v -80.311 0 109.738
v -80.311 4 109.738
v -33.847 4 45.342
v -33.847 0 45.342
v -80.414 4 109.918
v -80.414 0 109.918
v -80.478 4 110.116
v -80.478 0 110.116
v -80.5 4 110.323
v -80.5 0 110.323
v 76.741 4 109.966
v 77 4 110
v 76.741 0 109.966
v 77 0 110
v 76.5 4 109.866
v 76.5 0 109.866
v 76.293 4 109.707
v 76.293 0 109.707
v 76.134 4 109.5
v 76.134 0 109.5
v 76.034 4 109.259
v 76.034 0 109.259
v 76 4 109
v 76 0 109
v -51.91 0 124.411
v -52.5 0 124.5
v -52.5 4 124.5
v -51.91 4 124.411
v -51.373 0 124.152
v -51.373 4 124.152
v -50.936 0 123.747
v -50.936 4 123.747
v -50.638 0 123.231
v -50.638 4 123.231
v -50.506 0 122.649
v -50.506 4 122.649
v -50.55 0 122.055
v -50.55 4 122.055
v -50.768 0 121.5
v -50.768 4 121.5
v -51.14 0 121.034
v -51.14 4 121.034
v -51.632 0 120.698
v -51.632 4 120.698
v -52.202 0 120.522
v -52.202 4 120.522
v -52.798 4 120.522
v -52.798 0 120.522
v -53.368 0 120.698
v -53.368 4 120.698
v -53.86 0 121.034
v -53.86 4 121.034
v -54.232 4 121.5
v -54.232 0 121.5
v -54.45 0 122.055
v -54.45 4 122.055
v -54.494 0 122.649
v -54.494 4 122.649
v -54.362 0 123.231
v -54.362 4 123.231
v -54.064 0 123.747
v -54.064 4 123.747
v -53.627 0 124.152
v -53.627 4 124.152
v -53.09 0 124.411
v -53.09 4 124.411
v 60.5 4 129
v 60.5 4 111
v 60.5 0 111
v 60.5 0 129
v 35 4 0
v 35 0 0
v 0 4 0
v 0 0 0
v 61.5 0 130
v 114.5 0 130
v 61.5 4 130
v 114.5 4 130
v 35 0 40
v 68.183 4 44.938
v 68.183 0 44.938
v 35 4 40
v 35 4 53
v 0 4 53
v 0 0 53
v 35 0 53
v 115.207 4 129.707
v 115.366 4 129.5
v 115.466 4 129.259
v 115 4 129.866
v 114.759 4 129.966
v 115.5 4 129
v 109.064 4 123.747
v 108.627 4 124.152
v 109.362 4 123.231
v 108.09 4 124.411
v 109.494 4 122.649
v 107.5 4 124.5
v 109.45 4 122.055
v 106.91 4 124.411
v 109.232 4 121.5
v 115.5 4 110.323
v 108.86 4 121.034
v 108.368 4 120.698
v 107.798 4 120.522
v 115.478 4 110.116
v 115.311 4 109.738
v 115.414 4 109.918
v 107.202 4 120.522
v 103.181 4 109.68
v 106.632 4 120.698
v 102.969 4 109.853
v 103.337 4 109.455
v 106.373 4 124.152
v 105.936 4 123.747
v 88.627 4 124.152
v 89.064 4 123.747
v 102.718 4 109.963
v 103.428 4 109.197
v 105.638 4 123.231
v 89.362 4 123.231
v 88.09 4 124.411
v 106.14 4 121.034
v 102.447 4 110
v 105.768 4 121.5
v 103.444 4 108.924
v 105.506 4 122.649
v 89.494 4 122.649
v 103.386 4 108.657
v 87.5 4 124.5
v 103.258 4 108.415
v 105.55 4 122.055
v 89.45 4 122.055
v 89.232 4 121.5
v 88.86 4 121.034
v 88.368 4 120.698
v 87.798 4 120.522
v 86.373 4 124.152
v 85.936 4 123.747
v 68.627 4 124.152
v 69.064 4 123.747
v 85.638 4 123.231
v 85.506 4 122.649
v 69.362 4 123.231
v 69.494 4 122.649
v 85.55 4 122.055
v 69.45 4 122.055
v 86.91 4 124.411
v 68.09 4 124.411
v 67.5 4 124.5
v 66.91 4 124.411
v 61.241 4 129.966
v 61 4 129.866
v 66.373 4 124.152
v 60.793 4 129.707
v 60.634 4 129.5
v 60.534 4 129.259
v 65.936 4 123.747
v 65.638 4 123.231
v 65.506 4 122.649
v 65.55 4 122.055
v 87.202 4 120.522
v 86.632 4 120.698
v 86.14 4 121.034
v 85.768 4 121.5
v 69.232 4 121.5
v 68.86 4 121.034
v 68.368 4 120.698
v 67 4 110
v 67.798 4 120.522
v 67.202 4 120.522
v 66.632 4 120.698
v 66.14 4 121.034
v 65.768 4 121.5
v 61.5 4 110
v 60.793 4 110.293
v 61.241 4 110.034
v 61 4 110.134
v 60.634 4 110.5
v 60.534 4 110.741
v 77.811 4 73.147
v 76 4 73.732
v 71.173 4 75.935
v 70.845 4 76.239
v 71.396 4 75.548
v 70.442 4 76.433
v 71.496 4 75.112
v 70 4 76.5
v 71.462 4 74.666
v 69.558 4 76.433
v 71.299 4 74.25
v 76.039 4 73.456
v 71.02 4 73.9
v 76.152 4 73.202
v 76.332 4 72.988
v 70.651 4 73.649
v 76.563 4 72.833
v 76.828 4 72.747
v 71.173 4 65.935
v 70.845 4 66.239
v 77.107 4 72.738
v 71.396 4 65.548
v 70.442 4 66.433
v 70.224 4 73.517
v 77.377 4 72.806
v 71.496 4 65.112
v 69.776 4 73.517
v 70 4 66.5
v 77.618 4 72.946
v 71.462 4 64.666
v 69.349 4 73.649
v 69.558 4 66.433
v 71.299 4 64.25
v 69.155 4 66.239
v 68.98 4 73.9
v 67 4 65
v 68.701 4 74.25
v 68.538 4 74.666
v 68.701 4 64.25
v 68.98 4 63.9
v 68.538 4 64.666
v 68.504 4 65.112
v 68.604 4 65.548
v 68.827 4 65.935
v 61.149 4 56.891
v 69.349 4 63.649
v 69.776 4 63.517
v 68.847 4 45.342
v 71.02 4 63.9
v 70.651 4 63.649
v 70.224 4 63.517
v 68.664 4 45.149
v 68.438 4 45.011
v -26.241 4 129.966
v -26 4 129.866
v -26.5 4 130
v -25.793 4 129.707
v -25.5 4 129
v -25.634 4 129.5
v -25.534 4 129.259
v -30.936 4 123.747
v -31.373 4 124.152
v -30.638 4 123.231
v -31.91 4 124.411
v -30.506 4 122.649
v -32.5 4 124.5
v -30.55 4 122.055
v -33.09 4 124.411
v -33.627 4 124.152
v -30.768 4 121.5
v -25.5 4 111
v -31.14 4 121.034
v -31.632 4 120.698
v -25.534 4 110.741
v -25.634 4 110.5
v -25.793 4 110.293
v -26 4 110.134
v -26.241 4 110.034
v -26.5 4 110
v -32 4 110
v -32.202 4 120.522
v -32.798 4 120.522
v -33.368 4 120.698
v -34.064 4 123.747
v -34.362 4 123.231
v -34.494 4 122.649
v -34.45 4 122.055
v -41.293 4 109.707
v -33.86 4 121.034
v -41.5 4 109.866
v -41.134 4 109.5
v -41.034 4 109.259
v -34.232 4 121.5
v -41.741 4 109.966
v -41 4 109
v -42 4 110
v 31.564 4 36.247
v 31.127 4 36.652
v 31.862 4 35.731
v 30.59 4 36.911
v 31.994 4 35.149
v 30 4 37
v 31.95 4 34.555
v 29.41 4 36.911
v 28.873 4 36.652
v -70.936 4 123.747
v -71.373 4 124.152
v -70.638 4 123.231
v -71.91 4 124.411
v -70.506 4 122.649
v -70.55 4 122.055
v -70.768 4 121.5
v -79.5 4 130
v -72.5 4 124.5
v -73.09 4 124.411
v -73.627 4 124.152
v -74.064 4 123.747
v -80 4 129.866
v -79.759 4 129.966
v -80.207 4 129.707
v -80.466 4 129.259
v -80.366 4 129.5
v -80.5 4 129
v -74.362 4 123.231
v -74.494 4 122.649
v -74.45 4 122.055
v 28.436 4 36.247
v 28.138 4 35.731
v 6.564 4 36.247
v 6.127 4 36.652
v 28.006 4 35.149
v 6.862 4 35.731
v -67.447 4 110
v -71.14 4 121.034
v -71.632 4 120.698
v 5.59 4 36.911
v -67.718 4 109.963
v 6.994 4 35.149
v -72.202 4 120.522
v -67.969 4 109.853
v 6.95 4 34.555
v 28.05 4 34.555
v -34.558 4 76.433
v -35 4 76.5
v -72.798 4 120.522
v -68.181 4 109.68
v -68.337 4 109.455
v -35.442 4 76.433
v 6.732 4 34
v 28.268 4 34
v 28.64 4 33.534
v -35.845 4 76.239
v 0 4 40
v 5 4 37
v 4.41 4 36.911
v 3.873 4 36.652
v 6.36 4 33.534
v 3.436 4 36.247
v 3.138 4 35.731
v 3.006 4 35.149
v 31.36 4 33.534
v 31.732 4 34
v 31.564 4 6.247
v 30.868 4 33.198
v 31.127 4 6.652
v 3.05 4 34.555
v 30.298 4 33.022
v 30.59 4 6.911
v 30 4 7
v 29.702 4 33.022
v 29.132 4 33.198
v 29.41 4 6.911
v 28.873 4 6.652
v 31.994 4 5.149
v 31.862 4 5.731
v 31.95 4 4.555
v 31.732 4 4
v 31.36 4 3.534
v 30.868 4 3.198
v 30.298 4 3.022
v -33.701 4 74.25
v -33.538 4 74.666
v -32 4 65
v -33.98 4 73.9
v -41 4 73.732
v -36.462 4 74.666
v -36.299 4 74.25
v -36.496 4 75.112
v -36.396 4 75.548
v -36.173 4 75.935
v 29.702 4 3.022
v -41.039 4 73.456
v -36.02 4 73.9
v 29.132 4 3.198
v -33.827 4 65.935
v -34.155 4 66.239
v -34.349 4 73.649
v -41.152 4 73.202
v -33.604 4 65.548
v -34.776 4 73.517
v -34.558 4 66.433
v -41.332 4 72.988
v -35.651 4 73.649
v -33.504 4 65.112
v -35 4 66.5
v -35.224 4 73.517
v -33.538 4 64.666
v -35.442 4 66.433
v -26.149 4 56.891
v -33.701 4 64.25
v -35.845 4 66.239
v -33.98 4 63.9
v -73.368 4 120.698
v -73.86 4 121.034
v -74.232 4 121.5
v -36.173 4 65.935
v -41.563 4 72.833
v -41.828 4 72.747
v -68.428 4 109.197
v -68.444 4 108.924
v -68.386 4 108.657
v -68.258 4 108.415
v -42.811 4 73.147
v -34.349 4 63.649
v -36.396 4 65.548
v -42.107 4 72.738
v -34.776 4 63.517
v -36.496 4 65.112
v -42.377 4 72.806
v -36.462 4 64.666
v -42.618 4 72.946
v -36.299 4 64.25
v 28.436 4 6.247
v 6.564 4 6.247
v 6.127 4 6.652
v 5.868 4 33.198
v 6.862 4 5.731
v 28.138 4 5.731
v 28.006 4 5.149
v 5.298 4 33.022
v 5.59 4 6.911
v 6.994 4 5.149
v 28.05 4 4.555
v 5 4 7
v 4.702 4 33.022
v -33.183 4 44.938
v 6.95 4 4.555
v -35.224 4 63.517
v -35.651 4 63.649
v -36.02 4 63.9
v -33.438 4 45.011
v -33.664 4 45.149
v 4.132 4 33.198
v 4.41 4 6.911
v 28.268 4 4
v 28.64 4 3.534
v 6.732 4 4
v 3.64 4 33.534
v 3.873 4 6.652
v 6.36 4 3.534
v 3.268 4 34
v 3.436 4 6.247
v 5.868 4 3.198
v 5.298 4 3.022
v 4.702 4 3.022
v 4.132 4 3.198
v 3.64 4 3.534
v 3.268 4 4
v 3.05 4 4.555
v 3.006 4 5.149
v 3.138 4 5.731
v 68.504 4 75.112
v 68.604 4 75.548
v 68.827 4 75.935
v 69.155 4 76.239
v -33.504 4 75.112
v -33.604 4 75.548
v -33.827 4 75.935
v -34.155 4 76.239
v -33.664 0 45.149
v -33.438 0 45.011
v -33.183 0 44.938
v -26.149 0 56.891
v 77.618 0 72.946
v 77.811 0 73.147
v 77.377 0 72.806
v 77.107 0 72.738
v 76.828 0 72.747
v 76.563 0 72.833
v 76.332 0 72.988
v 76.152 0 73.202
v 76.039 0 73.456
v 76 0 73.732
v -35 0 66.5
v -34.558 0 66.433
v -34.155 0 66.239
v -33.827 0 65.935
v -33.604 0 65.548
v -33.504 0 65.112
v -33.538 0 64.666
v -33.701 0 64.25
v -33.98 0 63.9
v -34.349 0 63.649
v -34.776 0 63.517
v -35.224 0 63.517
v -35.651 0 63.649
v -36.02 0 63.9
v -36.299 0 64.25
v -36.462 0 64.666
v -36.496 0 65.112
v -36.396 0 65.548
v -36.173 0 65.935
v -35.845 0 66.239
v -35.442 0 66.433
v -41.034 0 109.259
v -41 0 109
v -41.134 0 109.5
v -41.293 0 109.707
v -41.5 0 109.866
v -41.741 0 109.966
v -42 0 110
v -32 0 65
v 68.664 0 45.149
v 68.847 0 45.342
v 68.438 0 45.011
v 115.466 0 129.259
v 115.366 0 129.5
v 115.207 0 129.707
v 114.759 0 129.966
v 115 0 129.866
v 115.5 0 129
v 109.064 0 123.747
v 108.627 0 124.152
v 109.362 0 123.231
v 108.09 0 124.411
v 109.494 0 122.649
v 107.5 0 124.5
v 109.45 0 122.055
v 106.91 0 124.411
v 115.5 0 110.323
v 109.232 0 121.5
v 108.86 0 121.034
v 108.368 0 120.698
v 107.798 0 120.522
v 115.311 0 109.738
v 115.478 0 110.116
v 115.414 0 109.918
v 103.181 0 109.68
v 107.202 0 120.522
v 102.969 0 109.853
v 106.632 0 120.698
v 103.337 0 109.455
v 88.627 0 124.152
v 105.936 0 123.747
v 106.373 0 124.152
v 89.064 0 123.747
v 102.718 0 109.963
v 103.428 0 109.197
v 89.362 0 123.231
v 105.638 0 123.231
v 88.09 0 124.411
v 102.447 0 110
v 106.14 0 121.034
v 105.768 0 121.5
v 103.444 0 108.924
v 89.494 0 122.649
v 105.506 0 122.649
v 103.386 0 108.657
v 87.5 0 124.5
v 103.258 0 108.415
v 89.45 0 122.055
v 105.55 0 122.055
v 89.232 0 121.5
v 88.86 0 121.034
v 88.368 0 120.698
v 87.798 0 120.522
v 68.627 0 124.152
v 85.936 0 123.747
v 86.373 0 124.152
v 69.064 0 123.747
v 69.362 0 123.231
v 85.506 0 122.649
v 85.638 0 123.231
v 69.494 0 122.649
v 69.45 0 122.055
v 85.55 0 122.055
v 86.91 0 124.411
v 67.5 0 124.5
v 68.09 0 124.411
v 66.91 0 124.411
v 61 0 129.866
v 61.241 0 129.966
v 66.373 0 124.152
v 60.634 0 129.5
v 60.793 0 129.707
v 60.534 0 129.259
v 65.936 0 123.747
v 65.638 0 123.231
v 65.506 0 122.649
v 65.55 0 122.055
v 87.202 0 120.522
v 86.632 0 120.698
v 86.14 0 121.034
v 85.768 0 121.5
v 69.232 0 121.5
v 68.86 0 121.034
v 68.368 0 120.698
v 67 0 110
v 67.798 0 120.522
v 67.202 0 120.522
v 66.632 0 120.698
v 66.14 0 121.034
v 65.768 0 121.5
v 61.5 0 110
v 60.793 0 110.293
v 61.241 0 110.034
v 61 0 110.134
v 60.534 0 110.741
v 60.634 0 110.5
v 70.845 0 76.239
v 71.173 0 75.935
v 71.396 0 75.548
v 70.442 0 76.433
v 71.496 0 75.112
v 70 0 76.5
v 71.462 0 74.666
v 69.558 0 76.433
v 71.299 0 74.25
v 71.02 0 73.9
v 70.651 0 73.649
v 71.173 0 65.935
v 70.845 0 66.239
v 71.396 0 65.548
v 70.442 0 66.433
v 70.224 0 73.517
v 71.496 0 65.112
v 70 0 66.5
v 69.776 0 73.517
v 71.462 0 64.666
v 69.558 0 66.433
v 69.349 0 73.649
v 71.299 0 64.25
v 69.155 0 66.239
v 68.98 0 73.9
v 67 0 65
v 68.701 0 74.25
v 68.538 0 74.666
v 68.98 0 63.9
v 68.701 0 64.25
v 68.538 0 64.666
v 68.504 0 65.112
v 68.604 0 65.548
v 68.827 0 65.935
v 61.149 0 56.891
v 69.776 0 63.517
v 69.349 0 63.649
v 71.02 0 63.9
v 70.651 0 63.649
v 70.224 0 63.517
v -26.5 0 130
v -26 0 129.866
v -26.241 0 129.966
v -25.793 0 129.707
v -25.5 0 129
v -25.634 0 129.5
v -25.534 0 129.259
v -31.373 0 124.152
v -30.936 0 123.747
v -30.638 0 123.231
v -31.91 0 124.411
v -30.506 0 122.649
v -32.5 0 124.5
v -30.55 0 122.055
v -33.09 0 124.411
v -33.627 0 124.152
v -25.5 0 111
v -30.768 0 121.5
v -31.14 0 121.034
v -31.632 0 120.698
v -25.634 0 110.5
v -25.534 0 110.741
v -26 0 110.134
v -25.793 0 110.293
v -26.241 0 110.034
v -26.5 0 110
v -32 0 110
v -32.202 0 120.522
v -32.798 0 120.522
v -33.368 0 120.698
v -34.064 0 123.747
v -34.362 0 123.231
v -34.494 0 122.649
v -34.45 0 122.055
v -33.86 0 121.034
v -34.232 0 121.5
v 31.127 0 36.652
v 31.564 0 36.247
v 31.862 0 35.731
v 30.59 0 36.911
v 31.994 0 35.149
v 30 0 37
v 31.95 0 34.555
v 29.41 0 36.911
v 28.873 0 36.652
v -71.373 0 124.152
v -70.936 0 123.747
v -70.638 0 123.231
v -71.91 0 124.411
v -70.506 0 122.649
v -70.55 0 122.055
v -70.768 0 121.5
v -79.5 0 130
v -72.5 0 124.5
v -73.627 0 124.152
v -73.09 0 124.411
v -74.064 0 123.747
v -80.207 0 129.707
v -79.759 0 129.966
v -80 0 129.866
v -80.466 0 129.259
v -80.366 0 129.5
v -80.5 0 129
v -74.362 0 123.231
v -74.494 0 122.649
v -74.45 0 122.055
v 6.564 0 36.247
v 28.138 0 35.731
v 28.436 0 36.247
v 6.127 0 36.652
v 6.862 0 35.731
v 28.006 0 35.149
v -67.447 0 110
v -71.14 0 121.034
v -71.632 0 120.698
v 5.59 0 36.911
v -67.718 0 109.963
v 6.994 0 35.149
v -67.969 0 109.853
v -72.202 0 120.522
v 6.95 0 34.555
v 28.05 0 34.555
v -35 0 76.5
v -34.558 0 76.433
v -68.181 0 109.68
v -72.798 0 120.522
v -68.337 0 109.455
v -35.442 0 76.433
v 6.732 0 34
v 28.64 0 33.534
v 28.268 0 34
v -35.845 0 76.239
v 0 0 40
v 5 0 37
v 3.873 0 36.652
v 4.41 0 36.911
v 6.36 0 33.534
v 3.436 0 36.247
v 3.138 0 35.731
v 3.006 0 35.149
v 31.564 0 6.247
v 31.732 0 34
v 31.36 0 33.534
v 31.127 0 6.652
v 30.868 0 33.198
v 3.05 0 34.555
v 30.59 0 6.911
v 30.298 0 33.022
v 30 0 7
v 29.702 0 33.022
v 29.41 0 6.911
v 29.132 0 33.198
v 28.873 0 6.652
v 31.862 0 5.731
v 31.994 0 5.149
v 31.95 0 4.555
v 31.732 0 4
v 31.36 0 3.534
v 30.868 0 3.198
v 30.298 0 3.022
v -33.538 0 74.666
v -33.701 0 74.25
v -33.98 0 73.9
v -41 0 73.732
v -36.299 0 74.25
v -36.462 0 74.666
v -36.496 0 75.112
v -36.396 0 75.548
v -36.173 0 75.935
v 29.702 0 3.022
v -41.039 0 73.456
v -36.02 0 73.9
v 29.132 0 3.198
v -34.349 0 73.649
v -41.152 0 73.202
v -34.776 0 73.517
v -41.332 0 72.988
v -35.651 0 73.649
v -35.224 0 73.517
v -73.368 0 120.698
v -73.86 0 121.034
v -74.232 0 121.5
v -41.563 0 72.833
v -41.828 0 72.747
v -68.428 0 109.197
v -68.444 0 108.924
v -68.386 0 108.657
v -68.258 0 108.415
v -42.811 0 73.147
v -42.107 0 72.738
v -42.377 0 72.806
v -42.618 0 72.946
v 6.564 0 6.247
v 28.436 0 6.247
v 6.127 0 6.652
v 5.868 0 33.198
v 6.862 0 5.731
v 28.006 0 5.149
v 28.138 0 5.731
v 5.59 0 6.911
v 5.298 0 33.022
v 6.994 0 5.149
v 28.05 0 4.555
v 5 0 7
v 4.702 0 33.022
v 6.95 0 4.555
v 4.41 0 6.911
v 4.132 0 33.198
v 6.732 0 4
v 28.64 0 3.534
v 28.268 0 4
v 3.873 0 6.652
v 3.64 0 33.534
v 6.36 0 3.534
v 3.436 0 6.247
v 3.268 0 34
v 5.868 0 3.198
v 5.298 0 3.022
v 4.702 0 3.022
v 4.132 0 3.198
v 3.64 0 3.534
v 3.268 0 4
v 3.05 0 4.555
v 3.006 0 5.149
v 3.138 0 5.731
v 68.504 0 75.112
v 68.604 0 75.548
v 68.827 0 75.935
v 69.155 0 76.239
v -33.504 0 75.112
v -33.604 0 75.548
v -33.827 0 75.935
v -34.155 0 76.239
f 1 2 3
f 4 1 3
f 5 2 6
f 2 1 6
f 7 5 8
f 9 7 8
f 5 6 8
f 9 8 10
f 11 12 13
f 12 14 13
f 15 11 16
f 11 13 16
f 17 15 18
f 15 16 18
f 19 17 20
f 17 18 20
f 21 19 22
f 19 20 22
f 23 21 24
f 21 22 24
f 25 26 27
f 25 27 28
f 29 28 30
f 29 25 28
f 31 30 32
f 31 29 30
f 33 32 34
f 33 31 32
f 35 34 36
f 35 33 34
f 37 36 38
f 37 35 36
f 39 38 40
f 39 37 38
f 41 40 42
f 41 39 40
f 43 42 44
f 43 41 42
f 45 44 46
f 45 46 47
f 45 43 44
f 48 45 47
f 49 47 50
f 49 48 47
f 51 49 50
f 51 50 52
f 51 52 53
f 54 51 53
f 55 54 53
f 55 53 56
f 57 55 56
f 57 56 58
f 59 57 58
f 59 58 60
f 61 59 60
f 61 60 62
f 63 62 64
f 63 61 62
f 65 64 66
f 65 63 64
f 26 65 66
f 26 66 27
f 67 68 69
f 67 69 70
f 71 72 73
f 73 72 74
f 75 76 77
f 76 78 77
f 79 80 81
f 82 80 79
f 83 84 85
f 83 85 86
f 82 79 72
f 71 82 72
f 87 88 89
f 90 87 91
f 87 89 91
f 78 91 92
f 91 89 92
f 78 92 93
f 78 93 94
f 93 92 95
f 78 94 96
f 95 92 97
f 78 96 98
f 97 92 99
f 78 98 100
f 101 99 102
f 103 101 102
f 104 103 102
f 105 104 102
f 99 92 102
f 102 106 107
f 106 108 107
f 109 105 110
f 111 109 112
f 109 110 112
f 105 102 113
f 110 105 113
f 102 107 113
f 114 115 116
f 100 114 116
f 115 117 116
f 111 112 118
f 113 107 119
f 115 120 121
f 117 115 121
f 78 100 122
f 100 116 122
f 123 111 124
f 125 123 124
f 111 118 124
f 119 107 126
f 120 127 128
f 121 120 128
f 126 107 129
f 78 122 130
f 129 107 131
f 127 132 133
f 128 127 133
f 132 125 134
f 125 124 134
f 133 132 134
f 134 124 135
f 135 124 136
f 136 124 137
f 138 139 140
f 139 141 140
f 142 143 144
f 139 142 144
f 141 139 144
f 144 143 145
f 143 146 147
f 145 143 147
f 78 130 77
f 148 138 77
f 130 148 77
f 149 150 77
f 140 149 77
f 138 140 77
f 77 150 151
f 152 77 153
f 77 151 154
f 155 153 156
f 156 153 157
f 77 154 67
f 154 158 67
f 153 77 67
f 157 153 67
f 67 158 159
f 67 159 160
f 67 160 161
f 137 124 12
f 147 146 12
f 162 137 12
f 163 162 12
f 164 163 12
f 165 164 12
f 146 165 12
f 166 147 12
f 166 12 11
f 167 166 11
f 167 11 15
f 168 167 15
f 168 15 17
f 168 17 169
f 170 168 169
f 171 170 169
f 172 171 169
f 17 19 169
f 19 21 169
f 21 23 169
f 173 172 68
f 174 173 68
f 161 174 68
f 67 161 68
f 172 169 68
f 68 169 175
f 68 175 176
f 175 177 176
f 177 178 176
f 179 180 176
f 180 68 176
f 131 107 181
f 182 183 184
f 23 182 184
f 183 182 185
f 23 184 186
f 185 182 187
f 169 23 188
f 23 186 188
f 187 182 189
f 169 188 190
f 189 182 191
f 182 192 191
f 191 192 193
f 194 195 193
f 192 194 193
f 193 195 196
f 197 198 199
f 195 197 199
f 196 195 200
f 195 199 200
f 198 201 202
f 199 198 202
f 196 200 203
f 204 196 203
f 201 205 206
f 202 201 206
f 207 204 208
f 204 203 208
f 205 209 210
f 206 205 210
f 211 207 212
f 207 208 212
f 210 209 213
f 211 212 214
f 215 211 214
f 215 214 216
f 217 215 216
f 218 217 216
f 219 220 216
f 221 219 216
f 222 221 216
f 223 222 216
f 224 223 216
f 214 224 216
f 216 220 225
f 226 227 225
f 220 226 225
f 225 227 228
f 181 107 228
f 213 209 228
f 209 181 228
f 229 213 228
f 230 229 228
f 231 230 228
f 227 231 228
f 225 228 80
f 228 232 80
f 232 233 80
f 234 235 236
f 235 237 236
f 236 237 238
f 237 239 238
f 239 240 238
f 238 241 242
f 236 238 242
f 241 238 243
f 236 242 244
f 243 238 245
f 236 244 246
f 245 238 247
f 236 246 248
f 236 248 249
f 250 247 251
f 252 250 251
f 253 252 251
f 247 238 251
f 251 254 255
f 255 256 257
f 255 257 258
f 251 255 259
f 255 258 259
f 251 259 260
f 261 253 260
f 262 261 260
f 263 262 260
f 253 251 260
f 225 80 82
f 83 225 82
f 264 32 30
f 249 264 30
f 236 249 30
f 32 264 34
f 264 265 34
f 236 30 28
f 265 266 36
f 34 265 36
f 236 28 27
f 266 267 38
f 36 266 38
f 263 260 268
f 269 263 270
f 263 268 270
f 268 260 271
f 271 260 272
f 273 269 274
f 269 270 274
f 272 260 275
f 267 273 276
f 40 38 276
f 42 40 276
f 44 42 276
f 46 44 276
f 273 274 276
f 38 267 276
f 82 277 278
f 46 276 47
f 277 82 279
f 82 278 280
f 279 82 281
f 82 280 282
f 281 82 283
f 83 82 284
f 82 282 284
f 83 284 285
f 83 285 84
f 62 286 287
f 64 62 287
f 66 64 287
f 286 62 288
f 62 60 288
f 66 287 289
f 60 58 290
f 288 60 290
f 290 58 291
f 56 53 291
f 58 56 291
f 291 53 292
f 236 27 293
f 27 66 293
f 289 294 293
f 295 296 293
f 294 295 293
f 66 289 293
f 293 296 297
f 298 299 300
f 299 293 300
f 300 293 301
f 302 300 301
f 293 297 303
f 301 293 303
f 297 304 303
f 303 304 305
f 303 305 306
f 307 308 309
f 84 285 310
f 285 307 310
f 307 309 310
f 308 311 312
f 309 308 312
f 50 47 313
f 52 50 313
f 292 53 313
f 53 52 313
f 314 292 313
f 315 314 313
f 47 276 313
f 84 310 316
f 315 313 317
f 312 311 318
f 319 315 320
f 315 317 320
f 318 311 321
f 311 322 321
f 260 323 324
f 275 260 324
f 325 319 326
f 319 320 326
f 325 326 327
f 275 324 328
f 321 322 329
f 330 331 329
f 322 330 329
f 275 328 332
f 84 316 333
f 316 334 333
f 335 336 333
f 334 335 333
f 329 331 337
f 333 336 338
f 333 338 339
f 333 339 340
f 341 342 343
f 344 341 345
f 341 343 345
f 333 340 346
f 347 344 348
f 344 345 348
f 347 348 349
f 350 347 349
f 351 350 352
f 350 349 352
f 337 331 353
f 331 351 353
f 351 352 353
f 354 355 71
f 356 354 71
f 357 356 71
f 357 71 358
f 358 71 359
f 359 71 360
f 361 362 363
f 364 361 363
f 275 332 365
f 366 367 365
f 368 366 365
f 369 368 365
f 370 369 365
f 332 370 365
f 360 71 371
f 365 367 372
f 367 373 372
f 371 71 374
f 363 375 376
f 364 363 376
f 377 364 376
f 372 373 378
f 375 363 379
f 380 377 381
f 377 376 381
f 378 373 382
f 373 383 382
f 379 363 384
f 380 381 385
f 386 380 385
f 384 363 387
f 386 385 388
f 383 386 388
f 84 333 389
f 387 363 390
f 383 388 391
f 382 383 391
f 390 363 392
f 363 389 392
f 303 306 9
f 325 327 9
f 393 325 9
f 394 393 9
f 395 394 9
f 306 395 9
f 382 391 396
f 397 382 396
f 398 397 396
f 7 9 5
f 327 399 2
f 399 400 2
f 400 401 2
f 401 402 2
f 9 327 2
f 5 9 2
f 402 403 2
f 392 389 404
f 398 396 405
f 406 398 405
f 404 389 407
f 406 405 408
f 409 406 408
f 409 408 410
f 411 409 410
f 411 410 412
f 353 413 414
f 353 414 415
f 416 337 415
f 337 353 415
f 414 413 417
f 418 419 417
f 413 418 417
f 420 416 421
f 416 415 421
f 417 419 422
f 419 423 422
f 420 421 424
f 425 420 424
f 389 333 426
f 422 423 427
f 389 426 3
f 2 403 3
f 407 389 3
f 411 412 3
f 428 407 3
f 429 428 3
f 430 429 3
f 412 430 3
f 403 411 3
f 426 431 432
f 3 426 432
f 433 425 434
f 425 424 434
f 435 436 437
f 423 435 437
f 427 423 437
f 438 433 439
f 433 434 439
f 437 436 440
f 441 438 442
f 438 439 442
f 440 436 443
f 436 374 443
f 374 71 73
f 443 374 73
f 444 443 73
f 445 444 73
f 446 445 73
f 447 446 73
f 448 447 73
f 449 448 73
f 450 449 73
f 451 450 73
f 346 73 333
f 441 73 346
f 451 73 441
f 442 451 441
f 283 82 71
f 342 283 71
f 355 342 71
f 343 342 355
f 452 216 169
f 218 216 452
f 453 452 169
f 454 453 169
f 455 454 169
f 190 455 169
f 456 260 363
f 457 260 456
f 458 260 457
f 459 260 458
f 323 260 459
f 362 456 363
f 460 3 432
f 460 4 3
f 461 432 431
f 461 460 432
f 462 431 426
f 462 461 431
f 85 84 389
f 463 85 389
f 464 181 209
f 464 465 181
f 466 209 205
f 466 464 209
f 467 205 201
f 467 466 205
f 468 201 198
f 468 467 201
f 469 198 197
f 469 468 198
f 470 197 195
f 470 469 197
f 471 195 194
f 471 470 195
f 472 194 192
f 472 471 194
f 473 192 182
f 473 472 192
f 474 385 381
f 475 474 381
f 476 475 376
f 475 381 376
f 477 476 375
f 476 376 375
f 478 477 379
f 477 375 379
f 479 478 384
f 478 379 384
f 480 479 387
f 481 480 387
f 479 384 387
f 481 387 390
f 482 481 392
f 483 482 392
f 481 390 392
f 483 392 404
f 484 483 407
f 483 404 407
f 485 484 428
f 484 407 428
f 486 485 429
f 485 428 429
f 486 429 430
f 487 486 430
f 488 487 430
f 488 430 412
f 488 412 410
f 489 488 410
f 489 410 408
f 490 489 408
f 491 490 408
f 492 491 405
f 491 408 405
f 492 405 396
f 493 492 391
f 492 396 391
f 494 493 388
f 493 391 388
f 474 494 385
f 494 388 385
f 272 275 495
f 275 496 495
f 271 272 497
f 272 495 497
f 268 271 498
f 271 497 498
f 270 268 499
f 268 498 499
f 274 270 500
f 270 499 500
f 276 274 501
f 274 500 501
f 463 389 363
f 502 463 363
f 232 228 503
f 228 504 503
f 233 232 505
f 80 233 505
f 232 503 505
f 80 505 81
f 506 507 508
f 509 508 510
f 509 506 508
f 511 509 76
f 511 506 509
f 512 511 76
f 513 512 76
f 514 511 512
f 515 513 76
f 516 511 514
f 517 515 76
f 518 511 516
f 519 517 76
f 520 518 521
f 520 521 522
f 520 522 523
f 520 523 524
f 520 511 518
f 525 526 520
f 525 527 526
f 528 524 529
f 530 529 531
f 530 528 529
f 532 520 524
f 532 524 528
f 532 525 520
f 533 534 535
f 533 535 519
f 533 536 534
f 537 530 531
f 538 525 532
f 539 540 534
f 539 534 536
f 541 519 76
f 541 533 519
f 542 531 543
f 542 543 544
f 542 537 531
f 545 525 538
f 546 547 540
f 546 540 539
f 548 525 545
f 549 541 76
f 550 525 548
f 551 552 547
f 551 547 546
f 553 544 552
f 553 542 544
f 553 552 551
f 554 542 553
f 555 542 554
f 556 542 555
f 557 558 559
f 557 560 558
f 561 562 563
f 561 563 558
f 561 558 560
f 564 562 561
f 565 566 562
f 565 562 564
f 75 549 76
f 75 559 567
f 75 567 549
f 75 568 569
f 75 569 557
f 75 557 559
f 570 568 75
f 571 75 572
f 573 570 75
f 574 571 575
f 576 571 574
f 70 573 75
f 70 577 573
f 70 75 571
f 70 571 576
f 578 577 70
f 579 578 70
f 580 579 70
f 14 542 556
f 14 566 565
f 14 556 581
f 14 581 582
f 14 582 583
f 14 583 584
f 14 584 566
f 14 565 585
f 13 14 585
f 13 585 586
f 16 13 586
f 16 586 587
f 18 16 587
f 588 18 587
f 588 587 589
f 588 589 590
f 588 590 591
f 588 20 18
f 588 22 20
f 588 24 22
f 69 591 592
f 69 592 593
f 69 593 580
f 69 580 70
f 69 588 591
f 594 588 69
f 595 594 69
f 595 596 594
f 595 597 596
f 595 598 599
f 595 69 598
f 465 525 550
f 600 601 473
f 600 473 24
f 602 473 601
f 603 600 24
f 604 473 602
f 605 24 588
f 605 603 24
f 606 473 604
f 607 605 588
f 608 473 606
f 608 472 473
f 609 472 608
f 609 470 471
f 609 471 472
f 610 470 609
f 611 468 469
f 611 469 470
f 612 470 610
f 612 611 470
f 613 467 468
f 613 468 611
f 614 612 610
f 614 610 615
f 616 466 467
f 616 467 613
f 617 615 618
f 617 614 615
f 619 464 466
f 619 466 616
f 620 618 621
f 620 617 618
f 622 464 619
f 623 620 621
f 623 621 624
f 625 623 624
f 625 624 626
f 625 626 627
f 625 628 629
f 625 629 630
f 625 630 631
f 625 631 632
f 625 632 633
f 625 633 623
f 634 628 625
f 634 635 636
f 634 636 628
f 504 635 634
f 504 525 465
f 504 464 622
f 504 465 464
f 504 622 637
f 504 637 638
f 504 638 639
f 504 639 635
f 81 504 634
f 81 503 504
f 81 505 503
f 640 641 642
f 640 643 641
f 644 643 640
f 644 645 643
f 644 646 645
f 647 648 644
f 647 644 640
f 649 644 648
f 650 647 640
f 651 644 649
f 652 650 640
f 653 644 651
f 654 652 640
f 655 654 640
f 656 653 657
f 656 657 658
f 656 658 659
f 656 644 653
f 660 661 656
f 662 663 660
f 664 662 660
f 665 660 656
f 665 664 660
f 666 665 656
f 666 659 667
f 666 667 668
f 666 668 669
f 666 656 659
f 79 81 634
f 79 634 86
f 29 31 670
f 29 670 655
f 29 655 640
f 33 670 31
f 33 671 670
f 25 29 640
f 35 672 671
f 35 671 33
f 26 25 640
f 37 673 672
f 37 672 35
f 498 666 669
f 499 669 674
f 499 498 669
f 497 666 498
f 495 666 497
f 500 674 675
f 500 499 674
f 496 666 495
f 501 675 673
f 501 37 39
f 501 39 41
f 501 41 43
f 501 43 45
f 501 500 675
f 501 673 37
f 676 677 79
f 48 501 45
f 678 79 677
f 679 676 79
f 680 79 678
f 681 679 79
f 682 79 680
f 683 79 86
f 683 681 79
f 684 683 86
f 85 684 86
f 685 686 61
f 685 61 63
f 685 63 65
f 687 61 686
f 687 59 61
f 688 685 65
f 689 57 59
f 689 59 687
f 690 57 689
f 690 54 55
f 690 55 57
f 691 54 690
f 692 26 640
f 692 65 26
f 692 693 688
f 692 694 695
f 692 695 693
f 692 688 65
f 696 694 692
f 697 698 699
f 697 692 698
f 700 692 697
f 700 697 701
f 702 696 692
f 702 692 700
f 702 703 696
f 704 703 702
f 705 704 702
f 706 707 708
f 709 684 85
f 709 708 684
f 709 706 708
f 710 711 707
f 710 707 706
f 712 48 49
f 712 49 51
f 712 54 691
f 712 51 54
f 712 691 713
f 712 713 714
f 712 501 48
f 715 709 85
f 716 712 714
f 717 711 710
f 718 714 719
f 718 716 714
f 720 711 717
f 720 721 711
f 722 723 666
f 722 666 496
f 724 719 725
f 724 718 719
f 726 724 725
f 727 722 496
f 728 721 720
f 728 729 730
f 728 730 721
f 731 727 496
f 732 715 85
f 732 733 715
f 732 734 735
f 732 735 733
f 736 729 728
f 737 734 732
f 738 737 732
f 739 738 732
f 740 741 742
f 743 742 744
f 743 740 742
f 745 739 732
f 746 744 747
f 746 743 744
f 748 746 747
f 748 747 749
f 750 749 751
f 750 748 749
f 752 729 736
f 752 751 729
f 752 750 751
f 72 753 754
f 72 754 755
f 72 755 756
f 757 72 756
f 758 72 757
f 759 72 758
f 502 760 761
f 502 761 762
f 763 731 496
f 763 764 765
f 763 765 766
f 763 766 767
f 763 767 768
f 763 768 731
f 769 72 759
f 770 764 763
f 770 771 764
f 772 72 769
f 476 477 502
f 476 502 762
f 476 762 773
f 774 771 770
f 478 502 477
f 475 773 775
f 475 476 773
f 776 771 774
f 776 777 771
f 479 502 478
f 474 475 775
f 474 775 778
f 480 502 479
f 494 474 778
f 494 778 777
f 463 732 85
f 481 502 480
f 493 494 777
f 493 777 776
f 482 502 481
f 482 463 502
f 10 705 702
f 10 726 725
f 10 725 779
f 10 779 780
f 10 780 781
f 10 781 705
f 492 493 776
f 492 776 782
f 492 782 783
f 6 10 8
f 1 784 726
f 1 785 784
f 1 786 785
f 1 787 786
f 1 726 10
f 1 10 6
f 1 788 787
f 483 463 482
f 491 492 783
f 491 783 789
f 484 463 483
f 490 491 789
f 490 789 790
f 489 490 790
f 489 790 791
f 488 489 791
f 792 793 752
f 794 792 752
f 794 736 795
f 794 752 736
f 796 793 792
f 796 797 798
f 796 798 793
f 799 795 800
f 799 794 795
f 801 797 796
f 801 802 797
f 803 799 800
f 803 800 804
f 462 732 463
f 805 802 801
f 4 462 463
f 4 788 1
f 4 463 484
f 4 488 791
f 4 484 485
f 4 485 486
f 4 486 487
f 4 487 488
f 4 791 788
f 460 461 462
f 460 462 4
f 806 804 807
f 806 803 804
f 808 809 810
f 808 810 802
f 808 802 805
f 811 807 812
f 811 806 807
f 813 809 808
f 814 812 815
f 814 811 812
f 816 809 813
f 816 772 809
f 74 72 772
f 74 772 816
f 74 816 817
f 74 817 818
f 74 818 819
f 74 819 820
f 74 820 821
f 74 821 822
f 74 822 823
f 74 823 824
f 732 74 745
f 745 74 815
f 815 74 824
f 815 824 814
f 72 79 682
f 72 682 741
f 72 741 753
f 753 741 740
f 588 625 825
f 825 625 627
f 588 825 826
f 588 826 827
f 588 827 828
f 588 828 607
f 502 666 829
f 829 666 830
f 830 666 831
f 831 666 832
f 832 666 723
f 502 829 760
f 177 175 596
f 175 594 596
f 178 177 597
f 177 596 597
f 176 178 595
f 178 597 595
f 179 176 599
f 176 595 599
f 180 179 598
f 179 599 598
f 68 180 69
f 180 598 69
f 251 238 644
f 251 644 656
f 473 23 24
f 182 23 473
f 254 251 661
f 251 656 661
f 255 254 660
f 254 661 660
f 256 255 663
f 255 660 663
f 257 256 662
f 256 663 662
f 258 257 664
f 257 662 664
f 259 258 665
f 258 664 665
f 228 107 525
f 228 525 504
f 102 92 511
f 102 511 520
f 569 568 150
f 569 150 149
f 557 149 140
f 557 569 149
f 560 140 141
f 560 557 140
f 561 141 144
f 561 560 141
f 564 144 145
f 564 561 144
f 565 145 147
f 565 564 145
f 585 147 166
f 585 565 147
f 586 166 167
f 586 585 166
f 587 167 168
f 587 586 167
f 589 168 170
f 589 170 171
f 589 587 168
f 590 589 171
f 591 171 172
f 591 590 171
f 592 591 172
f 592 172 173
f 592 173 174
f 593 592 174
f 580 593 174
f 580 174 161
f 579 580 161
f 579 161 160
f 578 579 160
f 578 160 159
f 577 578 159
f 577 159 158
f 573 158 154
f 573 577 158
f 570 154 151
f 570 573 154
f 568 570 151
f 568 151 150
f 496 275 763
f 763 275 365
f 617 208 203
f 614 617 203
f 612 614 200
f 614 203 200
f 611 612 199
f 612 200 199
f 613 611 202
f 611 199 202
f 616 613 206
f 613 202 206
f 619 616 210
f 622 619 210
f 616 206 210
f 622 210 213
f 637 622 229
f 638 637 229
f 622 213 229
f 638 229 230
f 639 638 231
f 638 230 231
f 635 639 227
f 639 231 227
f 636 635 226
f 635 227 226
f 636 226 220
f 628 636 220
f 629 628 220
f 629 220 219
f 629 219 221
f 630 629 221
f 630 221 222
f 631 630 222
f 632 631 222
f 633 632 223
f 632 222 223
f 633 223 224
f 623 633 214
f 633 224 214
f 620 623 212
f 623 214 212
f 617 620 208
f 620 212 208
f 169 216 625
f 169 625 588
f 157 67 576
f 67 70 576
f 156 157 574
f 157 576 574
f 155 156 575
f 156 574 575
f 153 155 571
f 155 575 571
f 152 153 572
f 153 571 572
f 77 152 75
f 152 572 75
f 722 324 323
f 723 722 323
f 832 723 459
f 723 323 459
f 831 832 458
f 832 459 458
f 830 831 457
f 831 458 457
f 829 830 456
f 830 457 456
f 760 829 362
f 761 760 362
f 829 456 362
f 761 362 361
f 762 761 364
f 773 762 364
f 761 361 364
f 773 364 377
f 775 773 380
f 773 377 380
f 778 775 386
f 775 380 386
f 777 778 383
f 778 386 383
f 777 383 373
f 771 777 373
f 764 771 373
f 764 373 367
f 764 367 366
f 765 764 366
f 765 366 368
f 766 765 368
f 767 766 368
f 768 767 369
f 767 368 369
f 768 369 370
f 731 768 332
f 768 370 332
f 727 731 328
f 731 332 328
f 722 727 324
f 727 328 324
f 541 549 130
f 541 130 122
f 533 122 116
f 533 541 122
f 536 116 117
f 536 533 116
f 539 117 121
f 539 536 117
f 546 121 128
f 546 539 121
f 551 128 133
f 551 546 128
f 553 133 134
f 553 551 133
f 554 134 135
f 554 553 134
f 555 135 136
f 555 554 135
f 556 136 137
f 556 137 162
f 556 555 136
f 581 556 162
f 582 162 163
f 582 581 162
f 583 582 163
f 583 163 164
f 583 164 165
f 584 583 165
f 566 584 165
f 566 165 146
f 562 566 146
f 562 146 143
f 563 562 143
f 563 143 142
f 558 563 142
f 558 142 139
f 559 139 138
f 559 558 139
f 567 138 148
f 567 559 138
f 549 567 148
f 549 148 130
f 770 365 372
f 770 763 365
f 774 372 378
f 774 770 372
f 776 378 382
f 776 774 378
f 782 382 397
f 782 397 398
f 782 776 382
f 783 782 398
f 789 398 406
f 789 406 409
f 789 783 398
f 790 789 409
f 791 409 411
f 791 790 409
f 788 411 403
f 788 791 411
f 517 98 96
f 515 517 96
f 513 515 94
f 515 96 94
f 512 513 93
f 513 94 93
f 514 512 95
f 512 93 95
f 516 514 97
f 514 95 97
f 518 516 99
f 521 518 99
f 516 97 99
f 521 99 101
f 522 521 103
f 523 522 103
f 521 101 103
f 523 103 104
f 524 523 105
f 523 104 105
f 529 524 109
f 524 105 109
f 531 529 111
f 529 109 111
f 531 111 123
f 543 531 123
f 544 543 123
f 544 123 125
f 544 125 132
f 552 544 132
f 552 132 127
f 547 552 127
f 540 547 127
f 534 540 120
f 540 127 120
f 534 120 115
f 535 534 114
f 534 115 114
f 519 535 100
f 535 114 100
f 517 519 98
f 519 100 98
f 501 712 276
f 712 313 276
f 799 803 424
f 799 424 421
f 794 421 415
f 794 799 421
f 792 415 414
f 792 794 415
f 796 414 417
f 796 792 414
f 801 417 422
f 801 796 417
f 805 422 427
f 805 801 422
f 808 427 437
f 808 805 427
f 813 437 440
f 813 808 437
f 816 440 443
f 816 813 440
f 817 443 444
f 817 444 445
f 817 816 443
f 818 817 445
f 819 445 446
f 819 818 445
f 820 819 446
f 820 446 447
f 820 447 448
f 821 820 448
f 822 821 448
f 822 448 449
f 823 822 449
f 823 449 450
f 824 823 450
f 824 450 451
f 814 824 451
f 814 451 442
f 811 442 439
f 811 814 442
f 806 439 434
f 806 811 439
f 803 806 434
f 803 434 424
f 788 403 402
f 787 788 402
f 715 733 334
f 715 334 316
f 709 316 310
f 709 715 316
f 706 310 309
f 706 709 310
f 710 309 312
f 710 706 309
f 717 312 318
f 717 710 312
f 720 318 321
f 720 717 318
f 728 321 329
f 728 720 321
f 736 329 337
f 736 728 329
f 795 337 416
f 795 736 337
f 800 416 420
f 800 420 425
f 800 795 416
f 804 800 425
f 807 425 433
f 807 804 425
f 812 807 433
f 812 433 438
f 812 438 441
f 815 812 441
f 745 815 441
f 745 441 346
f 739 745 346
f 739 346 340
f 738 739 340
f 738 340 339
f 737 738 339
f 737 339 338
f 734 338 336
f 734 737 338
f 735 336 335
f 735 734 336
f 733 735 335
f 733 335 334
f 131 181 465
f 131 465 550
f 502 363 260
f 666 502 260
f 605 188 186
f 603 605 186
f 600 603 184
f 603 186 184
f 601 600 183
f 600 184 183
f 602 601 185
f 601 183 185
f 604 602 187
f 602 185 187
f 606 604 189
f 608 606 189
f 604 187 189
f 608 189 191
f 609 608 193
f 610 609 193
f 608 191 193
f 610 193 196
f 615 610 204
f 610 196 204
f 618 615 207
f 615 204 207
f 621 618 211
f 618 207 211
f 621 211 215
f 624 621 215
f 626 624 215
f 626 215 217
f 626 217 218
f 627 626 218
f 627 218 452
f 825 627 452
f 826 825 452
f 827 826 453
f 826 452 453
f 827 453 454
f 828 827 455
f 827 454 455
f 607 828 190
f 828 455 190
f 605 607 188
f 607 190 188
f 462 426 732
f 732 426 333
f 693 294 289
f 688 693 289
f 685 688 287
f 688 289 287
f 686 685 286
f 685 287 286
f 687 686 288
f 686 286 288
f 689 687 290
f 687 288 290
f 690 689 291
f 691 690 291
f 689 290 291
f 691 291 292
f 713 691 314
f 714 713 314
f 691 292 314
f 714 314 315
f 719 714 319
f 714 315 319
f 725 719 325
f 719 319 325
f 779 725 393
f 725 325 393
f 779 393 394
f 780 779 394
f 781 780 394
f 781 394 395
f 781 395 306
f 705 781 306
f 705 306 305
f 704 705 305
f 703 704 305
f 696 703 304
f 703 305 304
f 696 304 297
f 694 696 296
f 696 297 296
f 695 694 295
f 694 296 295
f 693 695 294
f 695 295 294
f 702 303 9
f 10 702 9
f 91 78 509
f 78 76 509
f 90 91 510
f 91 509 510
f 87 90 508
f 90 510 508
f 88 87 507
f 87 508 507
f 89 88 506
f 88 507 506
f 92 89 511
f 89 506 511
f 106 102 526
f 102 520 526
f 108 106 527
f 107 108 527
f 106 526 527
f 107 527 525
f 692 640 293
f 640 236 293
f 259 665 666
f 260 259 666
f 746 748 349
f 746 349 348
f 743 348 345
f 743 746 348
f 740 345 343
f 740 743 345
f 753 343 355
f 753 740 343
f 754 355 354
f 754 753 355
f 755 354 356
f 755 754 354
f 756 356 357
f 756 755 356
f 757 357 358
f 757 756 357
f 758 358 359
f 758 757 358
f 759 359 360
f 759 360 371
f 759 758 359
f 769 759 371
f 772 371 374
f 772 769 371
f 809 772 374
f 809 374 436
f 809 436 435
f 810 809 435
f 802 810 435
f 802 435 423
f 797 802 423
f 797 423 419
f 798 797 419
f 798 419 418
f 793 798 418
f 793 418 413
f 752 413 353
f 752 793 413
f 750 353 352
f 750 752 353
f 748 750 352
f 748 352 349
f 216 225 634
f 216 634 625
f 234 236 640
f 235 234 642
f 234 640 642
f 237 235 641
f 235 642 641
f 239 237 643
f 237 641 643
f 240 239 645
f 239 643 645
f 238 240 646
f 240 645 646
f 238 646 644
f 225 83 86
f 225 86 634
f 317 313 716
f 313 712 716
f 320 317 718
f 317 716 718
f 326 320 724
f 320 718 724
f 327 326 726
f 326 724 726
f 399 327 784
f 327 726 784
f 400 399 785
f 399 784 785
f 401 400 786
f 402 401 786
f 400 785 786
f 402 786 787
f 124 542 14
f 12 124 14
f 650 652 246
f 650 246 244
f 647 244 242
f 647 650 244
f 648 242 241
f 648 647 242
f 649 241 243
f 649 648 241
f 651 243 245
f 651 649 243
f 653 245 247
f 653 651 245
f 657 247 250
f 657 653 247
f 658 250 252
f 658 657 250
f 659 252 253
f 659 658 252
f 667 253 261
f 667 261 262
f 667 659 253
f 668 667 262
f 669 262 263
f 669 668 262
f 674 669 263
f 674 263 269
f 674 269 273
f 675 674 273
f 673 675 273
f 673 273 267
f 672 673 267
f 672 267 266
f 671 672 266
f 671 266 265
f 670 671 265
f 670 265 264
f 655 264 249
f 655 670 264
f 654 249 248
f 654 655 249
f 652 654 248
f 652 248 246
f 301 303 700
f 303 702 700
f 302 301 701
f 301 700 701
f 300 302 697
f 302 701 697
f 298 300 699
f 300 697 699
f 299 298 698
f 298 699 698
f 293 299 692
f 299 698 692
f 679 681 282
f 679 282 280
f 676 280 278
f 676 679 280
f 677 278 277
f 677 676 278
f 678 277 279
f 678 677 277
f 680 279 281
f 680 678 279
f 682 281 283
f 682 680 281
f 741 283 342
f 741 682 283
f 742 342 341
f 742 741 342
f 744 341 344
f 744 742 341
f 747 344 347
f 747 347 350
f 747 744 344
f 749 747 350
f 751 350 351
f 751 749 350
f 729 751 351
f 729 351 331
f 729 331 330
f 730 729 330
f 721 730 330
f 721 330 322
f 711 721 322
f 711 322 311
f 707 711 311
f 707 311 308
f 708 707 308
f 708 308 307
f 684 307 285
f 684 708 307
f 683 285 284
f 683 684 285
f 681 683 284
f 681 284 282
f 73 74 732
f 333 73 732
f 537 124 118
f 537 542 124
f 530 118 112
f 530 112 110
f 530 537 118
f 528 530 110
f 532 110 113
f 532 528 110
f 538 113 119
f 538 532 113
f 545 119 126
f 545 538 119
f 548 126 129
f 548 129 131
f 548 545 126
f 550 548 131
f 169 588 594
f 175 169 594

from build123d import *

# Parameters (mm, degrees)
SKETCH_1_R          = 2
EXTRUDE_1_DEPTH     = 4
SKETCH_2_R          = 1.5
SKETCH_2_R_2        = 2
EXTRUDE_2_DEPTH     = 4
CUT_EXTRUDE_1_DEPTH = 174.943237868
FILLET_2_R          = 1
FILLET_3_R          = 1


with BuildPart() as part:
    # 草图1 → 凸台-拉伸1 (new body)
    with BuildSketch(Plane(origin=(0, 0, 0), x_dir=(1, 0, 0), z_dir=(0, 1, 0))):
        Polygon((0, 0), (0, -110), (-62.5, -110), (-62.5, -130), (97.5, -130), (97.5, -110), (35, -110), (35, 0), align=None)
        with Locations(Location((5, -5, 0), (0, 0, 270))):
            Circle(SKETCH_1_R, mode=Mode.SUBTRACT)
        with Locations(Location((30, -5, 0), (0, 0, 270))):
            Circle(SKETCH_1_R, mode=Mode.SUBTRACT)
        with Locations(Location((5, -35, 0), (0, 0, 270))):
            Circle(SKETCH_1_R, mode=Mode.SUBTRACT)
        with Locations(Location((30, -35, 0), (0, 0, 270))):
            Circle(SKETCH_1_R, mode=Mode.SUBTRACT)
        with Locations(Location((-52.5, -122.5, 0), (0, 0, 270))):
            Circle(SKETCH_1_R, mode=Mode.SUBTRACT)
        with Locations(Location((-32.5, -122.5, 0), (0, 0, 270))):
            Circle(SKETCH_1_R, mode=Mode.SUBTRACT)
        with Locations(Location((-12.5, -122.5, 0), (0, 0, 270))):
            Circle(SKETCH_1_R, mode=Mode.SUBTRACT)
        with Locations(Location((7.5, -122.5, 0), (0, 0, 270))):
            Circle(SKETCH_1_R, mode=Mode.SUBTRACT)
        with Locations(Location((27.5, -122.5, 0), (0, 0, 270))):
            Circle(SKETCH_1_R, mode=Mode.SUBTRACT)
        with Locations(Location((47.5, -122.5, 0), (0, 0, 270))):
            Circle(SKETCH_1_R, mode=Mode.SUBTRACT)
        with Locations(Location((67.5, -122.5, 0), (0, 0, 270))):
            Circle(SKETCH_1_R, mode=Mode.SUBTRACT)
        with Locations(Location((87.5, -122.5, 0), (0, 0, 270))):
            Circle(SKETCH_1_R, mode=Mode.SUBTRACT)
    extrude(amount=EXTRUDE_1_DEPTH)

    # 草图2 → 凸台-拉伸2 (add)
    # profile 1 of 2: a face of its own
    with BuildSketch(Plane(origin=(0, 4, 0), x_dir=(1, 0, 0), z_dir=(0, 1, 0))):
        Polygon((0, -40), (0, -53), (-26.149225941, -56.891259047), (-32, -65), (-32, -110), (-41, -110), (-41, -70.637206461), (-69.401796613, -110), (-62.5, -110), (-62.5, -130), (-80.5, -130), (-80.5, -110), (-33.599955214, -45), align=None)
        with Locations(Location((-35, -65, 0), (0, 0, 270))):
            Circle(SKETCH_2_R, mode=Mode.SUBTRACT)
        with Locations(Location((-35, -75, 0), (0, 0, 270))):
            Circle(SKETCH_2_R, mode=Mode.SUBTRACT)
        with Locations(Location((-72.5, -122.5, 0), (0, 0, 270))):
            Circle(SKETCH_2_R_2, mode=Mode.SUBTRACT)
    # profile 2 of 2: a face of its own
    with BuildSketch(Plane(origin=(0, 4, 0), x_dir=(1, 0, 0), z_dir=(0, 1, 0))):
        Polygon((67, -65), (67, -110), (76, -110), (76, -70.637206461), (104.401796613, -110), (97.5, -110), (97.5, -130), (115.5, -130), (115.5, -110), (68.599955214, -45), (35, -40), (35, -53), (61.149225941, -56.891259047), align=None)
        with Locations(Location((70, -65, 0), (0, 0, 270))):
            Circle(SKETCH_2_R, mode=Mode.SUBTRACT)
        with Locations(Location((70, -75, 0), (0, 0, 270))):
            Circle(SKETCH_2_R, mode=Mode.SUBTRACT)
        with Locations(Location((107.5, -122.5, 0), (0, 0, 270))):
            Circle(SKETCH_2_R_2, mode=Mode.SUBTRACT)
    extrude(amount=-EXTRUDE_2_DEPTH)

    # 草图3 → 切除-拉伸1 (cut, through all)
    with BuildSketch(Plane(origin=(0, 4, 0), x_dir=(1, 0, 0), z_dir=(0, 1, 0))):
        Polygon((0, -53), (35, -53), (35, -110), (60.5, -110), (60.5, -130), (-25.5, -130), (-25.5, -110), (0, -110), align=None)
    extrude(amount=-CUT_EXTRUDE_1_DEPTH, mode=Mode.SUBTRACT)

    # 圆角2
    fillet_2_edges = [part.edges().sort_by_distance(p)[0] for p in [
        (76, 2, 70.637206461),
        (104.401796613, 2, 110),
        (76, 2, 110),
        (-41, 2, 70.637206461),
        (-41, 2, 110),
        (-69.401796613, 2, 110),
    ]]
    fillet(fillet_2_edges, radius=FILLET_2_R)

    # 圆角3
    fillet_3_edges = [part.edges().sort_by_distance(p)[0] for p in [
        (115.5, 2, 130),
        (115.5, 2, 110),
        (68.599955214, 2, 45),
        (60.5, 2, 110),
        (60.5, 2, 130),
        (-25.5, 2, 130),
        (-25.5, 2, 110),
        (-33.599955214, 2, 45),
        (-80.5, 2, 110),
        (-80.5, 2, 130),
    ]]
    fillet(fillet_3_edges, radius=FILLET_3_R)


solid = part.part
